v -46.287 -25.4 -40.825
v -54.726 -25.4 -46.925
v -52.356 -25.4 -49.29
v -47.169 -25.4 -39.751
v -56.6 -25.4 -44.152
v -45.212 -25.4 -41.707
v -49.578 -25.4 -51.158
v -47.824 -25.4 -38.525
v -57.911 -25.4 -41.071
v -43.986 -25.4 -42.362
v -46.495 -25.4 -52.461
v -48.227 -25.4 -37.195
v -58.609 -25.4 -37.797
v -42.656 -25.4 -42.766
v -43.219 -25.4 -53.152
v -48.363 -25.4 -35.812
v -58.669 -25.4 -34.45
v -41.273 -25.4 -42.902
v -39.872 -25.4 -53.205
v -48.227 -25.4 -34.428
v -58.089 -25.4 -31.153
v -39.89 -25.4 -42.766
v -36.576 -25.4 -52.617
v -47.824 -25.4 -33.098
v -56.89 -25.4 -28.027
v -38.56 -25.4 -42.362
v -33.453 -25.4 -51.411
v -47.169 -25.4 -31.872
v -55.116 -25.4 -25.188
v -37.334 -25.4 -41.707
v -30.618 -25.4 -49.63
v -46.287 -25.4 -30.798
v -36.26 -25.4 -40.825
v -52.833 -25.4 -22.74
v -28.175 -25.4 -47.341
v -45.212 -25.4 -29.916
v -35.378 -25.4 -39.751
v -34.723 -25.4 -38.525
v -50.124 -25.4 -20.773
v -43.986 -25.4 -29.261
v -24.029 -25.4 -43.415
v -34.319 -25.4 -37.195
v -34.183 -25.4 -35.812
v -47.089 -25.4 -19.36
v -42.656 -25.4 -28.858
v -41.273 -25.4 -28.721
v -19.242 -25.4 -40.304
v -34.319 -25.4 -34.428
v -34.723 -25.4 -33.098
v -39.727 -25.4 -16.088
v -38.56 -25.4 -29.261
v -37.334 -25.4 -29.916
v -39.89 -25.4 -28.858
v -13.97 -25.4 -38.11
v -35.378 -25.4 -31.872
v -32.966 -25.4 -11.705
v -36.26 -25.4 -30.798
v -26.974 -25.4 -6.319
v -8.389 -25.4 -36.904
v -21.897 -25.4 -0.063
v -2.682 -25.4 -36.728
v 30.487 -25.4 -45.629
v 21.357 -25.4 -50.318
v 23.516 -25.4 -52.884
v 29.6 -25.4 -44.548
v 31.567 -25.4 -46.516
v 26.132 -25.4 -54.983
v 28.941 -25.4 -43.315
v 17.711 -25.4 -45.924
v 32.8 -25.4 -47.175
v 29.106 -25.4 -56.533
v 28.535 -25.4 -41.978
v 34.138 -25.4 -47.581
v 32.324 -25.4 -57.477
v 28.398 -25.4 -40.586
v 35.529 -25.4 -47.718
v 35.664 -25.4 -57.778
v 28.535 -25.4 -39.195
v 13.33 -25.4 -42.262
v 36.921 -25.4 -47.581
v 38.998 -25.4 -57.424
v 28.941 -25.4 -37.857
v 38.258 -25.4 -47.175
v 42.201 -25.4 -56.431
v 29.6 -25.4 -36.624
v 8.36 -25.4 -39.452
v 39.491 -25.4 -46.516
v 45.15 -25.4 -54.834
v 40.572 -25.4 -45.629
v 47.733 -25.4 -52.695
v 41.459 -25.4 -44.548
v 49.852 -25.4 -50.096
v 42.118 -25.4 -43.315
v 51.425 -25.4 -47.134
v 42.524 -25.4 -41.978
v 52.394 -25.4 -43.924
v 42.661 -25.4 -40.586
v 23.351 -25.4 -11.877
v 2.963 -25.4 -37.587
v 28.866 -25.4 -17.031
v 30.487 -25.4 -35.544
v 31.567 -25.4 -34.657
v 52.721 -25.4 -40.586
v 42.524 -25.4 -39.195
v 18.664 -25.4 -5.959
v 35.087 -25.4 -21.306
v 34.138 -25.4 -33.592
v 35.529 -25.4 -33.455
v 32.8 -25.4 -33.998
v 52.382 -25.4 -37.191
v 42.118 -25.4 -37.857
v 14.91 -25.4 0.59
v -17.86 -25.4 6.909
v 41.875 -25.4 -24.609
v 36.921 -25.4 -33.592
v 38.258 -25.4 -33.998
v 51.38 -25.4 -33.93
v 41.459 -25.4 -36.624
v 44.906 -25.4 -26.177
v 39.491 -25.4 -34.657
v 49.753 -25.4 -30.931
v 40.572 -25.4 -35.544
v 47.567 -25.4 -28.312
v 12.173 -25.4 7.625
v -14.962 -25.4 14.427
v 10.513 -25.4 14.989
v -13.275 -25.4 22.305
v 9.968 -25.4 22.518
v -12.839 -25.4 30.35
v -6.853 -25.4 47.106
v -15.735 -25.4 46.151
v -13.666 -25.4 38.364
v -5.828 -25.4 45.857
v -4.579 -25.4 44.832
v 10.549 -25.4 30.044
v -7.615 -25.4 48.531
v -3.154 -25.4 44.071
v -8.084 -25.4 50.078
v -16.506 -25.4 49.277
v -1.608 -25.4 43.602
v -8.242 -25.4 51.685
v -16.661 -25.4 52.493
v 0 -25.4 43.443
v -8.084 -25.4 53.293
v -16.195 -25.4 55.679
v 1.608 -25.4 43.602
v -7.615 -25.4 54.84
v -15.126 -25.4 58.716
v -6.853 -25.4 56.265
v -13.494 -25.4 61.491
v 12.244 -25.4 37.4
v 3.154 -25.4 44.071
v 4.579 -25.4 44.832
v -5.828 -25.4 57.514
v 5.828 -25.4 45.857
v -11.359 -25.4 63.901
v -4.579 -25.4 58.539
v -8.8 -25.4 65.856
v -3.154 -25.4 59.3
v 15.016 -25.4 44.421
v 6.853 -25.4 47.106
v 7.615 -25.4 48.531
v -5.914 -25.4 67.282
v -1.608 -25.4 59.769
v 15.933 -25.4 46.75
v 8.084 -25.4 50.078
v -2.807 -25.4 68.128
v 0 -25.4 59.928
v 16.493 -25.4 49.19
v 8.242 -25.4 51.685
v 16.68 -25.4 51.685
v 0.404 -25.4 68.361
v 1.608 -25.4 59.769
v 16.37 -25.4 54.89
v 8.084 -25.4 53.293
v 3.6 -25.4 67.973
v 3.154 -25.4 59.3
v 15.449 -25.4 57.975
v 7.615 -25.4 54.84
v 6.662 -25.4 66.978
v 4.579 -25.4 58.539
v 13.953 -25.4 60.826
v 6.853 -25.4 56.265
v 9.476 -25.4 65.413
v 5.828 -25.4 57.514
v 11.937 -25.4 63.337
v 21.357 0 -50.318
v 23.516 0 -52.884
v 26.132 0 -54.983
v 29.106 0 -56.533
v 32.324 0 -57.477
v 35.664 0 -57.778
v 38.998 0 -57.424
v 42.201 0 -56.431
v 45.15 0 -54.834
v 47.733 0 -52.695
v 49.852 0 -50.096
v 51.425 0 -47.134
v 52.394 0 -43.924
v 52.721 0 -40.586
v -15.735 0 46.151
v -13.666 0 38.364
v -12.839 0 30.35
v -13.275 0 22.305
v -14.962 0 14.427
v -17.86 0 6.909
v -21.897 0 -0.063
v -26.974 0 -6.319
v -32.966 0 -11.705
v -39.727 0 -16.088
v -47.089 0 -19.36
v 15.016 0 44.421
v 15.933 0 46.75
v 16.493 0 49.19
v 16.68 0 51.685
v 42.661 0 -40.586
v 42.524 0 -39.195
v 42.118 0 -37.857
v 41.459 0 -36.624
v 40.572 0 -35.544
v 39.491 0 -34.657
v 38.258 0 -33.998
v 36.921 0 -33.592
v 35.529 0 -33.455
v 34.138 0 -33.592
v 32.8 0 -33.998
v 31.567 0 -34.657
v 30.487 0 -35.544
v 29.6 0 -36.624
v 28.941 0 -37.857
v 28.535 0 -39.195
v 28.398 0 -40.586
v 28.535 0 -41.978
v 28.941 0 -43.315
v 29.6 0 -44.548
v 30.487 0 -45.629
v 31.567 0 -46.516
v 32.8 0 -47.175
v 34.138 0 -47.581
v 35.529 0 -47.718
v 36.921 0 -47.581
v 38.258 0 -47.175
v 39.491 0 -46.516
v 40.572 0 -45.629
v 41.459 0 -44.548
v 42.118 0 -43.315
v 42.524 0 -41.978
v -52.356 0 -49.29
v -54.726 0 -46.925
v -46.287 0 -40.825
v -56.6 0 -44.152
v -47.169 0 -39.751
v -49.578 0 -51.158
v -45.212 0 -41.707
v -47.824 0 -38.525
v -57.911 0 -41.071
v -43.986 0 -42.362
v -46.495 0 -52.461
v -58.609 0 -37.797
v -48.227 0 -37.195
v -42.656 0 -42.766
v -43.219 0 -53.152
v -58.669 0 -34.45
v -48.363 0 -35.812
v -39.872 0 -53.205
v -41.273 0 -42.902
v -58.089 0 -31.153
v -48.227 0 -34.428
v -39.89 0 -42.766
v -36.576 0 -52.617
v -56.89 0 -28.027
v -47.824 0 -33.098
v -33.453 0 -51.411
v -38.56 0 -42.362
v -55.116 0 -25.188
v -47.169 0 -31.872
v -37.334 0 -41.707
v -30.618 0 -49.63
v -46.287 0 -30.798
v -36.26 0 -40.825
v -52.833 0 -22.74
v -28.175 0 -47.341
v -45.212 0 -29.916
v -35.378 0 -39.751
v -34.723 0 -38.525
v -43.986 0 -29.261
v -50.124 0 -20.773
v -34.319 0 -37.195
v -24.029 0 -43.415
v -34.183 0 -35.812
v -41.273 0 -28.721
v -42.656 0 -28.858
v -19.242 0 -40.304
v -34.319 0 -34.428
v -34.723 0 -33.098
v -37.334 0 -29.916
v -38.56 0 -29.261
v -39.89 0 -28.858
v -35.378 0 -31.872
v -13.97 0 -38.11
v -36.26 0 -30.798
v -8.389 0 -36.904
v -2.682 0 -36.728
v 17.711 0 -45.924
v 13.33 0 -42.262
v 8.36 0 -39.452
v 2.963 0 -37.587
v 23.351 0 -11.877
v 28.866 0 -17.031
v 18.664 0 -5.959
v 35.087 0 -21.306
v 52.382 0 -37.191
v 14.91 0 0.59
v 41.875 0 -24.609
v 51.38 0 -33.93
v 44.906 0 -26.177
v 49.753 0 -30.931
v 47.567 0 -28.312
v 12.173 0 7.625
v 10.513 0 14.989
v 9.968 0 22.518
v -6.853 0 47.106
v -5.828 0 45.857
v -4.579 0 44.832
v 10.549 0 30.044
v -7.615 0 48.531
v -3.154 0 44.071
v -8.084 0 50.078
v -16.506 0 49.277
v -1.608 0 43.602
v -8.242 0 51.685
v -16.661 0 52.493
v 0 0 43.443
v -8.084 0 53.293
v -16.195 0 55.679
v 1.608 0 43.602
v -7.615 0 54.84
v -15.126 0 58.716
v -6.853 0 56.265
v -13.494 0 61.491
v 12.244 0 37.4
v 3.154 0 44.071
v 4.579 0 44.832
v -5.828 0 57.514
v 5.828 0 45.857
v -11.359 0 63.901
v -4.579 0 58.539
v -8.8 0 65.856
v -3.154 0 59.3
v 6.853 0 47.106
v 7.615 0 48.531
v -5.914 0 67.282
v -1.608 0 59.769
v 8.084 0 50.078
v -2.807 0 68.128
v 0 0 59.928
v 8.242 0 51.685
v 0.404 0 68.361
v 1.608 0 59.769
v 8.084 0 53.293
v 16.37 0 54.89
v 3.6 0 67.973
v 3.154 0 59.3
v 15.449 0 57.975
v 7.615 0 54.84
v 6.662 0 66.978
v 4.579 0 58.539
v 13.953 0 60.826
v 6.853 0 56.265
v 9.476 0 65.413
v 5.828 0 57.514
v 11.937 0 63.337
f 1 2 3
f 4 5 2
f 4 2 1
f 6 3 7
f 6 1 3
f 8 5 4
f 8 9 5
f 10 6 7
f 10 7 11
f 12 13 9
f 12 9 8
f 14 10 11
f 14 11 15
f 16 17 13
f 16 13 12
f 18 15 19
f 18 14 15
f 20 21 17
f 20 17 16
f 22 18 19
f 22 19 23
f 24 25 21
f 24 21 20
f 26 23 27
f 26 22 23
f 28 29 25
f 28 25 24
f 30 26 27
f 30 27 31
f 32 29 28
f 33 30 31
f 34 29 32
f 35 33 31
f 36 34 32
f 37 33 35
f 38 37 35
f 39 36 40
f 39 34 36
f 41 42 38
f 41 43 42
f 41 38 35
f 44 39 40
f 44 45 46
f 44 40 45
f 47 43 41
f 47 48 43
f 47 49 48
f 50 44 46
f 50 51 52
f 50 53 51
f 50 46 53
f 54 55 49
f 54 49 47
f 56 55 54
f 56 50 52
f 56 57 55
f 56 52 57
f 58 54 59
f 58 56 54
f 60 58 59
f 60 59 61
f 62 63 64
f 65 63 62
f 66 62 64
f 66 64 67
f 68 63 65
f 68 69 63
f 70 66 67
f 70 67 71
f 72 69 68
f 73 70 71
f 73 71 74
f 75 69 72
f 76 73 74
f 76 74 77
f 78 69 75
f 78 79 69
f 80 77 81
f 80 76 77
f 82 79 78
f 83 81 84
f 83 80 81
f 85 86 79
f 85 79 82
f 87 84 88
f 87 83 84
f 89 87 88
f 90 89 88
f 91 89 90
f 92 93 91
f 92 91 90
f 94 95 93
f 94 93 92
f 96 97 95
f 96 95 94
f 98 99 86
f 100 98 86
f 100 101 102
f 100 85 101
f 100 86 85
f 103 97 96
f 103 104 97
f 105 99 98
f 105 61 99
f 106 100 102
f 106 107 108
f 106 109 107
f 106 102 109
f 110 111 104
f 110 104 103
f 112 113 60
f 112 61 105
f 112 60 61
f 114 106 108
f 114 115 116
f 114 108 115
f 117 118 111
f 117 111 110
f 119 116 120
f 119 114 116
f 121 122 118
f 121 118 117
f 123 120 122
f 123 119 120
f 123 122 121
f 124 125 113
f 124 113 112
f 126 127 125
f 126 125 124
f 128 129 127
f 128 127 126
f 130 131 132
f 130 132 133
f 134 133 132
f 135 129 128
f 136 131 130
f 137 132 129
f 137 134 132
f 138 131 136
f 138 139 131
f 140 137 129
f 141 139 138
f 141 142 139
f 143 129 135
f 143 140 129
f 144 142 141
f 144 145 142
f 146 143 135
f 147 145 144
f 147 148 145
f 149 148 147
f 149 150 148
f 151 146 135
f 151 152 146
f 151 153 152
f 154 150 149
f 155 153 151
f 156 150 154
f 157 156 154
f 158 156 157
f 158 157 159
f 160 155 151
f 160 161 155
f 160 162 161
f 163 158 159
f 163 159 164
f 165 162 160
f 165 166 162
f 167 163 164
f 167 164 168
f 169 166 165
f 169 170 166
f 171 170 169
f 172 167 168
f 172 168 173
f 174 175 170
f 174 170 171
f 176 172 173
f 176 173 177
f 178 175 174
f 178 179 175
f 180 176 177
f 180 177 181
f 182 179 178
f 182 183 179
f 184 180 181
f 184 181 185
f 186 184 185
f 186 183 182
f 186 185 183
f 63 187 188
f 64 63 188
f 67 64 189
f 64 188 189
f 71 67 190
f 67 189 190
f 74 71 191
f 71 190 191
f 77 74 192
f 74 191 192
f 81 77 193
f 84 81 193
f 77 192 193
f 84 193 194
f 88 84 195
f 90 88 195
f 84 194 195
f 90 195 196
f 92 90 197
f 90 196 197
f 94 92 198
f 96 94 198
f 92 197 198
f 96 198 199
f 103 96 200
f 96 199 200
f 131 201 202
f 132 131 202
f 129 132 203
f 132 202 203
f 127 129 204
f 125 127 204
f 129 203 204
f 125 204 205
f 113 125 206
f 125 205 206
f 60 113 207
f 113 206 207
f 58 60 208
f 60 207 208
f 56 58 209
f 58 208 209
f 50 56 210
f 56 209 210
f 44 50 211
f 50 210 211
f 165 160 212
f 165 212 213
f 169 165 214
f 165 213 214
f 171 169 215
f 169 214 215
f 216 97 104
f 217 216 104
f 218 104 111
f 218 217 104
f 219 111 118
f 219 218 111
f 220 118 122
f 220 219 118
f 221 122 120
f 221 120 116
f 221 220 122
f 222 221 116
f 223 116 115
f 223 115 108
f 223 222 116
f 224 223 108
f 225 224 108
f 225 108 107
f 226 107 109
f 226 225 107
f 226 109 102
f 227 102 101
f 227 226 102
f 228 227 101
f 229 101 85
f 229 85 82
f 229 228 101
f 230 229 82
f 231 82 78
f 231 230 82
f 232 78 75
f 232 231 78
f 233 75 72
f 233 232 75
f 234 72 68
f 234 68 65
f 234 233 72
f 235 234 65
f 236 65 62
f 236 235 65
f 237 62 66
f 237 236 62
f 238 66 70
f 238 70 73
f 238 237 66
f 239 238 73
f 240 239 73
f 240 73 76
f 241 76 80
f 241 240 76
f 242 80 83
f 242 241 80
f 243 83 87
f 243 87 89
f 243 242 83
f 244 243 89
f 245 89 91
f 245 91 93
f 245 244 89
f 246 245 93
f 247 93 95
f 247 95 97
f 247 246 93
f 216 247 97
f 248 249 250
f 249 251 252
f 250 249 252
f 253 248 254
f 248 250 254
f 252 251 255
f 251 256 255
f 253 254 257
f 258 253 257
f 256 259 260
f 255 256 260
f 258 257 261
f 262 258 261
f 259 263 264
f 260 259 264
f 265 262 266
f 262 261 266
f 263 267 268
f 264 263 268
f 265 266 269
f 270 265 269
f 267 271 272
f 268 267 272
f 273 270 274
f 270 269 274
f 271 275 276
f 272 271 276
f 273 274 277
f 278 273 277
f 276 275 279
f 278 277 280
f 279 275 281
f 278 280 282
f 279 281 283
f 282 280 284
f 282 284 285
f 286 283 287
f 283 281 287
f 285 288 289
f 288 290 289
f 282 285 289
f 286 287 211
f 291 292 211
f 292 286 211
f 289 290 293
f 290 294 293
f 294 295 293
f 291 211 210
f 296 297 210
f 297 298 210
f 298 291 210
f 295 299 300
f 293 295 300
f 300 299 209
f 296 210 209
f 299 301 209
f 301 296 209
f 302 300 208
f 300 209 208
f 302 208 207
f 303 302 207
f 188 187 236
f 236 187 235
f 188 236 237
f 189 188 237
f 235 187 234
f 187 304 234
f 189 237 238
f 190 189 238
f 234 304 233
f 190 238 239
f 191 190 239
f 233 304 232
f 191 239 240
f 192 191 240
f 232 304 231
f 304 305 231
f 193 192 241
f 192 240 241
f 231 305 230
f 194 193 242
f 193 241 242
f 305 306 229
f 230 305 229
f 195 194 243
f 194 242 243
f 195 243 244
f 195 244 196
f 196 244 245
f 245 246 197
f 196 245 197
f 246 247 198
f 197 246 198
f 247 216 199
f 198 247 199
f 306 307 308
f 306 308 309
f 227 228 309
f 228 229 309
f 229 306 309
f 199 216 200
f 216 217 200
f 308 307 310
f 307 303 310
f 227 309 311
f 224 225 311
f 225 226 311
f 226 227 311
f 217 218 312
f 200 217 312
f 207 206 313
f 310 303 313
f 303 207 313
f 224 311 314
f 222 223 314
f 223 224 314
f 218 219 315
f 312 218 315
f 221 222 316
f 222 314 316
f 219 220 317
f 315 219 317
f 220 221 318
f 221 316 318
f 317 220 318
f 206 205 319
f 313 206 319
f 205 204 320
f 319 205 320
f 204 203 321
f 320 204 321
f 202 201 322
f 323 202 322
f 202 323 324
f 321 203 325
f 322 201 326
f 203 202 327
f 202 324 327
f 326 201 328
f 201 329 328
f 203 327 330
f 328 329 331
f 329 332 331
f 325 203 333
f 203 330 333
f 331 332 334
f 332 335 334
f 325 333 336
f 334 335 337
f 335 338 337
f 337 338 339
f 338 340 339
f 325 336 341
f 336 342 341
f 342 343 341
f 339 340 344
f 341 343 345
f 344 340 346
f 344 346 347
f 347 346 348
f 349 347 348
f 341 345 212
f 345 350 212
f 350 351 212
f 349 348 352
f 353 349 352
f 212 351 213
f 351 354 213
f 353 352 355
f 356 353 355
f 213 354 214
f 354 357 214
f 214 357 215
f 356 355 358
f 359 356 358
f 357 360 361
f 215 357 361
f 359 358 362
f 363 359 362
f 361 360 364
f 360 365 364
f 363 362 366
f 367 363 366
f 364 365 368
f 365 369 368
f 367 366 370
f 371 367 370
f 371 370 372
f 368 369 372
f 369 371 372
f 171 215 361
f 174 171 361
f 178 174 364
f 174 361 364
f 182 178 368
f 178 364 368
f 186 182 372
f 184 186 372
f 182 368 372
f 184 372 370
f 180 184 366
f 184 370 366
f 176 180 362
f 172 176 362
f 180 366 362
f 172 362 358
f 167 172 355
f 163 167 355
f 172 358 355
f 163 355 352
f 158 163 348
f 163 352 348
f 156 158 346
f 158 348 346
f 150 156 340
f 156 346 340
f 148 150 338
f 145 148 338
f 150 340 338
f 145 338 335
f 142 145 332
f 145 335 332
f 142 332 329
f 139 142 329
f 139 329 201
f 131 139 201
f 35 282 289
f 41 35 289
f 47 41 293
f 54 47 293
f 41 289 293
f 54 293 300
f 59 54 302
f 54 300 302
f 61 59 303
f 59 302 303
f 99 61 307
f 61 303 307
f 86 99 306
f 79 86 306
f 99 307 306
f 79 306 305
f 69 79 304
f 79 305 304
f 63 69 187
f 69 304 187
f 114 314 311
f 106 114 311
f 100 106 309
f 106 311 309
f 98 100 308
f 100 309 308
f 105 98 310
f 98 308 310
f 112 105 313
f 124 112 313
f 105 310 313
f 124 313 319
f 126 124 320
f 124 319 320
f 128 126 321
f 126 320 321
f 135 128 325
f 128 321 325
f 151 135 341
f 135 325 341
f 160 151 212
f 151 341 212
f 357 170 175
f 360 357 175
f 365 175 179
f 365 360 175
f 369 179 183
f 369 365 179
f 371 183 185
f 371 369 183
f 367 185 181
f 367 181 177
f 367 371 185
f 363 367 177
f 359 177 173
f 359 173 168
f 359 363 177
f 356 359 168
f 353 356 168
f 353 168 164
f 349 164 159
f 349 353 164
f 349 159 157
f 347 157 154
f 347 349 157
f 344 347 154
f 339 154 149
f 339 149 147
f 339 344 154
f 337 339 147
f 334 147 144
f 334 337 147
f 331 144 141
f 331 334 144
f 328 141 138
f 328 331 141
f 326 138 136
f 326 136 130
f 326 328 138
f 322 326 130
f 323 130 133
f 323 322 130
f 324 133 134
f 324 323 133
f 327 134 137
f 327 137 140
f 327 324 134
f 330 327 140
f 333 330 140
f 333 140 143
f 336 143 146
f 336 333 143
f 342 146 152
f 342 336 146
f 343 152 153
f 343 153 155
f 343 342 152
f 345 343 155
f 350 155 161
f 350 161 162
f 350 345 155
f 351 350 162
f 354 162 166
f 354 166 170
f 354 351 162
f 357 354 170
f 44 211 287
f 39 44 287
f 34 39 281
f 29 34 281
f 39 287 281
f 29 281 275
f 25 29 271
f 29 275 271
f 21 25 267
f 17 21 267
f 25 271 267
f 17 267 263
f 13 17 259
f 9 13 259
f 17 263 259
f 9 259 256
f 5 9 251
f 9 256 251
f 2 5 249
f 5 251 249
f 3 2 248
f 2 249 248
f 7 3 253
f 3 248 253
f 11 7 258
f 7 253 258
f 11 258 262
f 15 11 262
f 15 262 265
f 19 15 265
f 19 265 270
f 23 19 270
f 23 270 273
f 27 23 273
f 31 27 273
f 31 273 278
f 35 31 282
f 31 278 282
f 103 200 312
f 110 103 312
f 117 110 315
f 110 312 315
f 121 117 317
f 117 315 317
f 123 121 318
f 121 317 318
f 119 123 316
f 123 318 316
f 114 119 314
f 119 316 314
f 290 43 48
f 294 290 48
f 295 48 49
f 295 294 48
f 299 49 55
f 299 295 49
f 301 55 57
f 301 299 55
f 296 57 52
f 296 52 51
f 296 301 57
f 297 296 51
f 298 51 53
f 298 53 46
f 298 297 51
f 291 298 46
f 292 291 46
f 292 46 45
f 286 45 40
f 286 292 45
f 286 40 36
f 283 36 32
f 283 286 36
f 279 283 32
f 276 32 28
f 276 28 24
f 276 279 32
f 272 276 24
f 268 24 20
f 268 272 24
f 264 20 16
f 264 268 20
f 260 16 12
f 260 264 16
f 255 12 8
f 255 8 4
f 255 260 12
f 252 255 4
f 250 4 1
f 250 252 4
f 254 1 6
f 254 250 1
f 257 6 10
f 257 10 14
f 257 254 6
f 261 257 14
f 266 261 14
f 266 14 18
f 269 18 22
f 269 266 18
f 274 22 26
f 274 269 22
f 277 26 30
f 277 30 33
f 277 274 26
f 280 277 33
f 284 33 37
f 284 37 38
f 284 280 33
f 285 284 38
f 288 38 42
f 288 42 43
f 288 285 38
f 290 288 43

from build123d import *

# Parameters (mm, degrees)
F0_R     = 8.24218
F0_R_2   = 7.090267
F0_R_3   = 7.13126
F1_DEPTH = 25.4


with BuildPart() as f1:
    # F0 (on Front) → F1 (new body)
    with BuildSketch(Plane.XZ):
        with BuildLine():
            ThreePointArc((15.015572, 44.421411), (-0.936645, 35.031458), (-15.735387, 46.150886))
            ThreePointArc((-15.735387, 46.150886), (-17.859834, 6.909148), (-47.089189, -19.360076))
            ThreePointArc((-47.089189, -19.360076), (-31.198619, -21.564417), (-23.82385, -35.811597))
            ThreePointArc((-23.82385, -35.811597), (-24.94797, -41.973301), (-28.175494, -47.341107))
            ThreePointArc((-28.175494, -47.341107), (-2.68177, -36.728091), (21.357228, -50.318259))
            ThreePointArc((21.357228, -50.318259), (22.092081, -29.862581), (41.875179, -24.608653))
            ThreePointArc((41.875179, -24.608653), (13.410108, 4.056155), (15.015572, 44.421411))
        make_face()
        with BuildLine():
            ThreePointArc((15.015572, 44.421411), (16.258835, 47.959291), (16.680358, 51.685497))
            ThreePointArc((16.680358, 51.685497), (-2.807352, 68.127915), (-15.735387, 46.150886))
            ThreePointArc((-15.735387, 46.150886), (-0.936645, 35.031458), (15.015572, 44.421411))
        make_face()
        with Locations((0, 51.685497)):
            Circle(F0_R, mode=Mode.SUBTRACT)
        with BuildLine():
            ThreePointArc((-23.82385, -35.811597), (-31.198619, -21.564417), (-47.089189, -19.360076))
            ThreePointArc((-47.089189, -19.360076), (-55.729658, -45.583419), (-28.175494, -47.341107))
            ThreePointArc((-28.175494, -47.341107), (-24.94797, -41.973301), (-23.82385, -35.811597))
        make_face()
        with Locations((-41.273167, -35.811597)):
            Circle(F0_R_2, mode=Mode.SUBTRACT)
        with BuildLine():
            ThreePointArc((52.721042, -40.586339), (49.753447, -30.930781), (41.875179, -24.608653))
            ThreePointArc((41.875179, -24.608653), (22.092081, -29.862581), (21.357228, -50.318259))
            ThreePointArc((21.357228, -50.318259), (40.624096, -57.005833), (52.721042, -40.586339))
        make_face()
        with Locations((35.52927, -40.586339)):
            Circle(F0_R_3, mode=Mode.SUBTRACT)
    extrude(amount=F1_DEPTH)


solid = f1.part
